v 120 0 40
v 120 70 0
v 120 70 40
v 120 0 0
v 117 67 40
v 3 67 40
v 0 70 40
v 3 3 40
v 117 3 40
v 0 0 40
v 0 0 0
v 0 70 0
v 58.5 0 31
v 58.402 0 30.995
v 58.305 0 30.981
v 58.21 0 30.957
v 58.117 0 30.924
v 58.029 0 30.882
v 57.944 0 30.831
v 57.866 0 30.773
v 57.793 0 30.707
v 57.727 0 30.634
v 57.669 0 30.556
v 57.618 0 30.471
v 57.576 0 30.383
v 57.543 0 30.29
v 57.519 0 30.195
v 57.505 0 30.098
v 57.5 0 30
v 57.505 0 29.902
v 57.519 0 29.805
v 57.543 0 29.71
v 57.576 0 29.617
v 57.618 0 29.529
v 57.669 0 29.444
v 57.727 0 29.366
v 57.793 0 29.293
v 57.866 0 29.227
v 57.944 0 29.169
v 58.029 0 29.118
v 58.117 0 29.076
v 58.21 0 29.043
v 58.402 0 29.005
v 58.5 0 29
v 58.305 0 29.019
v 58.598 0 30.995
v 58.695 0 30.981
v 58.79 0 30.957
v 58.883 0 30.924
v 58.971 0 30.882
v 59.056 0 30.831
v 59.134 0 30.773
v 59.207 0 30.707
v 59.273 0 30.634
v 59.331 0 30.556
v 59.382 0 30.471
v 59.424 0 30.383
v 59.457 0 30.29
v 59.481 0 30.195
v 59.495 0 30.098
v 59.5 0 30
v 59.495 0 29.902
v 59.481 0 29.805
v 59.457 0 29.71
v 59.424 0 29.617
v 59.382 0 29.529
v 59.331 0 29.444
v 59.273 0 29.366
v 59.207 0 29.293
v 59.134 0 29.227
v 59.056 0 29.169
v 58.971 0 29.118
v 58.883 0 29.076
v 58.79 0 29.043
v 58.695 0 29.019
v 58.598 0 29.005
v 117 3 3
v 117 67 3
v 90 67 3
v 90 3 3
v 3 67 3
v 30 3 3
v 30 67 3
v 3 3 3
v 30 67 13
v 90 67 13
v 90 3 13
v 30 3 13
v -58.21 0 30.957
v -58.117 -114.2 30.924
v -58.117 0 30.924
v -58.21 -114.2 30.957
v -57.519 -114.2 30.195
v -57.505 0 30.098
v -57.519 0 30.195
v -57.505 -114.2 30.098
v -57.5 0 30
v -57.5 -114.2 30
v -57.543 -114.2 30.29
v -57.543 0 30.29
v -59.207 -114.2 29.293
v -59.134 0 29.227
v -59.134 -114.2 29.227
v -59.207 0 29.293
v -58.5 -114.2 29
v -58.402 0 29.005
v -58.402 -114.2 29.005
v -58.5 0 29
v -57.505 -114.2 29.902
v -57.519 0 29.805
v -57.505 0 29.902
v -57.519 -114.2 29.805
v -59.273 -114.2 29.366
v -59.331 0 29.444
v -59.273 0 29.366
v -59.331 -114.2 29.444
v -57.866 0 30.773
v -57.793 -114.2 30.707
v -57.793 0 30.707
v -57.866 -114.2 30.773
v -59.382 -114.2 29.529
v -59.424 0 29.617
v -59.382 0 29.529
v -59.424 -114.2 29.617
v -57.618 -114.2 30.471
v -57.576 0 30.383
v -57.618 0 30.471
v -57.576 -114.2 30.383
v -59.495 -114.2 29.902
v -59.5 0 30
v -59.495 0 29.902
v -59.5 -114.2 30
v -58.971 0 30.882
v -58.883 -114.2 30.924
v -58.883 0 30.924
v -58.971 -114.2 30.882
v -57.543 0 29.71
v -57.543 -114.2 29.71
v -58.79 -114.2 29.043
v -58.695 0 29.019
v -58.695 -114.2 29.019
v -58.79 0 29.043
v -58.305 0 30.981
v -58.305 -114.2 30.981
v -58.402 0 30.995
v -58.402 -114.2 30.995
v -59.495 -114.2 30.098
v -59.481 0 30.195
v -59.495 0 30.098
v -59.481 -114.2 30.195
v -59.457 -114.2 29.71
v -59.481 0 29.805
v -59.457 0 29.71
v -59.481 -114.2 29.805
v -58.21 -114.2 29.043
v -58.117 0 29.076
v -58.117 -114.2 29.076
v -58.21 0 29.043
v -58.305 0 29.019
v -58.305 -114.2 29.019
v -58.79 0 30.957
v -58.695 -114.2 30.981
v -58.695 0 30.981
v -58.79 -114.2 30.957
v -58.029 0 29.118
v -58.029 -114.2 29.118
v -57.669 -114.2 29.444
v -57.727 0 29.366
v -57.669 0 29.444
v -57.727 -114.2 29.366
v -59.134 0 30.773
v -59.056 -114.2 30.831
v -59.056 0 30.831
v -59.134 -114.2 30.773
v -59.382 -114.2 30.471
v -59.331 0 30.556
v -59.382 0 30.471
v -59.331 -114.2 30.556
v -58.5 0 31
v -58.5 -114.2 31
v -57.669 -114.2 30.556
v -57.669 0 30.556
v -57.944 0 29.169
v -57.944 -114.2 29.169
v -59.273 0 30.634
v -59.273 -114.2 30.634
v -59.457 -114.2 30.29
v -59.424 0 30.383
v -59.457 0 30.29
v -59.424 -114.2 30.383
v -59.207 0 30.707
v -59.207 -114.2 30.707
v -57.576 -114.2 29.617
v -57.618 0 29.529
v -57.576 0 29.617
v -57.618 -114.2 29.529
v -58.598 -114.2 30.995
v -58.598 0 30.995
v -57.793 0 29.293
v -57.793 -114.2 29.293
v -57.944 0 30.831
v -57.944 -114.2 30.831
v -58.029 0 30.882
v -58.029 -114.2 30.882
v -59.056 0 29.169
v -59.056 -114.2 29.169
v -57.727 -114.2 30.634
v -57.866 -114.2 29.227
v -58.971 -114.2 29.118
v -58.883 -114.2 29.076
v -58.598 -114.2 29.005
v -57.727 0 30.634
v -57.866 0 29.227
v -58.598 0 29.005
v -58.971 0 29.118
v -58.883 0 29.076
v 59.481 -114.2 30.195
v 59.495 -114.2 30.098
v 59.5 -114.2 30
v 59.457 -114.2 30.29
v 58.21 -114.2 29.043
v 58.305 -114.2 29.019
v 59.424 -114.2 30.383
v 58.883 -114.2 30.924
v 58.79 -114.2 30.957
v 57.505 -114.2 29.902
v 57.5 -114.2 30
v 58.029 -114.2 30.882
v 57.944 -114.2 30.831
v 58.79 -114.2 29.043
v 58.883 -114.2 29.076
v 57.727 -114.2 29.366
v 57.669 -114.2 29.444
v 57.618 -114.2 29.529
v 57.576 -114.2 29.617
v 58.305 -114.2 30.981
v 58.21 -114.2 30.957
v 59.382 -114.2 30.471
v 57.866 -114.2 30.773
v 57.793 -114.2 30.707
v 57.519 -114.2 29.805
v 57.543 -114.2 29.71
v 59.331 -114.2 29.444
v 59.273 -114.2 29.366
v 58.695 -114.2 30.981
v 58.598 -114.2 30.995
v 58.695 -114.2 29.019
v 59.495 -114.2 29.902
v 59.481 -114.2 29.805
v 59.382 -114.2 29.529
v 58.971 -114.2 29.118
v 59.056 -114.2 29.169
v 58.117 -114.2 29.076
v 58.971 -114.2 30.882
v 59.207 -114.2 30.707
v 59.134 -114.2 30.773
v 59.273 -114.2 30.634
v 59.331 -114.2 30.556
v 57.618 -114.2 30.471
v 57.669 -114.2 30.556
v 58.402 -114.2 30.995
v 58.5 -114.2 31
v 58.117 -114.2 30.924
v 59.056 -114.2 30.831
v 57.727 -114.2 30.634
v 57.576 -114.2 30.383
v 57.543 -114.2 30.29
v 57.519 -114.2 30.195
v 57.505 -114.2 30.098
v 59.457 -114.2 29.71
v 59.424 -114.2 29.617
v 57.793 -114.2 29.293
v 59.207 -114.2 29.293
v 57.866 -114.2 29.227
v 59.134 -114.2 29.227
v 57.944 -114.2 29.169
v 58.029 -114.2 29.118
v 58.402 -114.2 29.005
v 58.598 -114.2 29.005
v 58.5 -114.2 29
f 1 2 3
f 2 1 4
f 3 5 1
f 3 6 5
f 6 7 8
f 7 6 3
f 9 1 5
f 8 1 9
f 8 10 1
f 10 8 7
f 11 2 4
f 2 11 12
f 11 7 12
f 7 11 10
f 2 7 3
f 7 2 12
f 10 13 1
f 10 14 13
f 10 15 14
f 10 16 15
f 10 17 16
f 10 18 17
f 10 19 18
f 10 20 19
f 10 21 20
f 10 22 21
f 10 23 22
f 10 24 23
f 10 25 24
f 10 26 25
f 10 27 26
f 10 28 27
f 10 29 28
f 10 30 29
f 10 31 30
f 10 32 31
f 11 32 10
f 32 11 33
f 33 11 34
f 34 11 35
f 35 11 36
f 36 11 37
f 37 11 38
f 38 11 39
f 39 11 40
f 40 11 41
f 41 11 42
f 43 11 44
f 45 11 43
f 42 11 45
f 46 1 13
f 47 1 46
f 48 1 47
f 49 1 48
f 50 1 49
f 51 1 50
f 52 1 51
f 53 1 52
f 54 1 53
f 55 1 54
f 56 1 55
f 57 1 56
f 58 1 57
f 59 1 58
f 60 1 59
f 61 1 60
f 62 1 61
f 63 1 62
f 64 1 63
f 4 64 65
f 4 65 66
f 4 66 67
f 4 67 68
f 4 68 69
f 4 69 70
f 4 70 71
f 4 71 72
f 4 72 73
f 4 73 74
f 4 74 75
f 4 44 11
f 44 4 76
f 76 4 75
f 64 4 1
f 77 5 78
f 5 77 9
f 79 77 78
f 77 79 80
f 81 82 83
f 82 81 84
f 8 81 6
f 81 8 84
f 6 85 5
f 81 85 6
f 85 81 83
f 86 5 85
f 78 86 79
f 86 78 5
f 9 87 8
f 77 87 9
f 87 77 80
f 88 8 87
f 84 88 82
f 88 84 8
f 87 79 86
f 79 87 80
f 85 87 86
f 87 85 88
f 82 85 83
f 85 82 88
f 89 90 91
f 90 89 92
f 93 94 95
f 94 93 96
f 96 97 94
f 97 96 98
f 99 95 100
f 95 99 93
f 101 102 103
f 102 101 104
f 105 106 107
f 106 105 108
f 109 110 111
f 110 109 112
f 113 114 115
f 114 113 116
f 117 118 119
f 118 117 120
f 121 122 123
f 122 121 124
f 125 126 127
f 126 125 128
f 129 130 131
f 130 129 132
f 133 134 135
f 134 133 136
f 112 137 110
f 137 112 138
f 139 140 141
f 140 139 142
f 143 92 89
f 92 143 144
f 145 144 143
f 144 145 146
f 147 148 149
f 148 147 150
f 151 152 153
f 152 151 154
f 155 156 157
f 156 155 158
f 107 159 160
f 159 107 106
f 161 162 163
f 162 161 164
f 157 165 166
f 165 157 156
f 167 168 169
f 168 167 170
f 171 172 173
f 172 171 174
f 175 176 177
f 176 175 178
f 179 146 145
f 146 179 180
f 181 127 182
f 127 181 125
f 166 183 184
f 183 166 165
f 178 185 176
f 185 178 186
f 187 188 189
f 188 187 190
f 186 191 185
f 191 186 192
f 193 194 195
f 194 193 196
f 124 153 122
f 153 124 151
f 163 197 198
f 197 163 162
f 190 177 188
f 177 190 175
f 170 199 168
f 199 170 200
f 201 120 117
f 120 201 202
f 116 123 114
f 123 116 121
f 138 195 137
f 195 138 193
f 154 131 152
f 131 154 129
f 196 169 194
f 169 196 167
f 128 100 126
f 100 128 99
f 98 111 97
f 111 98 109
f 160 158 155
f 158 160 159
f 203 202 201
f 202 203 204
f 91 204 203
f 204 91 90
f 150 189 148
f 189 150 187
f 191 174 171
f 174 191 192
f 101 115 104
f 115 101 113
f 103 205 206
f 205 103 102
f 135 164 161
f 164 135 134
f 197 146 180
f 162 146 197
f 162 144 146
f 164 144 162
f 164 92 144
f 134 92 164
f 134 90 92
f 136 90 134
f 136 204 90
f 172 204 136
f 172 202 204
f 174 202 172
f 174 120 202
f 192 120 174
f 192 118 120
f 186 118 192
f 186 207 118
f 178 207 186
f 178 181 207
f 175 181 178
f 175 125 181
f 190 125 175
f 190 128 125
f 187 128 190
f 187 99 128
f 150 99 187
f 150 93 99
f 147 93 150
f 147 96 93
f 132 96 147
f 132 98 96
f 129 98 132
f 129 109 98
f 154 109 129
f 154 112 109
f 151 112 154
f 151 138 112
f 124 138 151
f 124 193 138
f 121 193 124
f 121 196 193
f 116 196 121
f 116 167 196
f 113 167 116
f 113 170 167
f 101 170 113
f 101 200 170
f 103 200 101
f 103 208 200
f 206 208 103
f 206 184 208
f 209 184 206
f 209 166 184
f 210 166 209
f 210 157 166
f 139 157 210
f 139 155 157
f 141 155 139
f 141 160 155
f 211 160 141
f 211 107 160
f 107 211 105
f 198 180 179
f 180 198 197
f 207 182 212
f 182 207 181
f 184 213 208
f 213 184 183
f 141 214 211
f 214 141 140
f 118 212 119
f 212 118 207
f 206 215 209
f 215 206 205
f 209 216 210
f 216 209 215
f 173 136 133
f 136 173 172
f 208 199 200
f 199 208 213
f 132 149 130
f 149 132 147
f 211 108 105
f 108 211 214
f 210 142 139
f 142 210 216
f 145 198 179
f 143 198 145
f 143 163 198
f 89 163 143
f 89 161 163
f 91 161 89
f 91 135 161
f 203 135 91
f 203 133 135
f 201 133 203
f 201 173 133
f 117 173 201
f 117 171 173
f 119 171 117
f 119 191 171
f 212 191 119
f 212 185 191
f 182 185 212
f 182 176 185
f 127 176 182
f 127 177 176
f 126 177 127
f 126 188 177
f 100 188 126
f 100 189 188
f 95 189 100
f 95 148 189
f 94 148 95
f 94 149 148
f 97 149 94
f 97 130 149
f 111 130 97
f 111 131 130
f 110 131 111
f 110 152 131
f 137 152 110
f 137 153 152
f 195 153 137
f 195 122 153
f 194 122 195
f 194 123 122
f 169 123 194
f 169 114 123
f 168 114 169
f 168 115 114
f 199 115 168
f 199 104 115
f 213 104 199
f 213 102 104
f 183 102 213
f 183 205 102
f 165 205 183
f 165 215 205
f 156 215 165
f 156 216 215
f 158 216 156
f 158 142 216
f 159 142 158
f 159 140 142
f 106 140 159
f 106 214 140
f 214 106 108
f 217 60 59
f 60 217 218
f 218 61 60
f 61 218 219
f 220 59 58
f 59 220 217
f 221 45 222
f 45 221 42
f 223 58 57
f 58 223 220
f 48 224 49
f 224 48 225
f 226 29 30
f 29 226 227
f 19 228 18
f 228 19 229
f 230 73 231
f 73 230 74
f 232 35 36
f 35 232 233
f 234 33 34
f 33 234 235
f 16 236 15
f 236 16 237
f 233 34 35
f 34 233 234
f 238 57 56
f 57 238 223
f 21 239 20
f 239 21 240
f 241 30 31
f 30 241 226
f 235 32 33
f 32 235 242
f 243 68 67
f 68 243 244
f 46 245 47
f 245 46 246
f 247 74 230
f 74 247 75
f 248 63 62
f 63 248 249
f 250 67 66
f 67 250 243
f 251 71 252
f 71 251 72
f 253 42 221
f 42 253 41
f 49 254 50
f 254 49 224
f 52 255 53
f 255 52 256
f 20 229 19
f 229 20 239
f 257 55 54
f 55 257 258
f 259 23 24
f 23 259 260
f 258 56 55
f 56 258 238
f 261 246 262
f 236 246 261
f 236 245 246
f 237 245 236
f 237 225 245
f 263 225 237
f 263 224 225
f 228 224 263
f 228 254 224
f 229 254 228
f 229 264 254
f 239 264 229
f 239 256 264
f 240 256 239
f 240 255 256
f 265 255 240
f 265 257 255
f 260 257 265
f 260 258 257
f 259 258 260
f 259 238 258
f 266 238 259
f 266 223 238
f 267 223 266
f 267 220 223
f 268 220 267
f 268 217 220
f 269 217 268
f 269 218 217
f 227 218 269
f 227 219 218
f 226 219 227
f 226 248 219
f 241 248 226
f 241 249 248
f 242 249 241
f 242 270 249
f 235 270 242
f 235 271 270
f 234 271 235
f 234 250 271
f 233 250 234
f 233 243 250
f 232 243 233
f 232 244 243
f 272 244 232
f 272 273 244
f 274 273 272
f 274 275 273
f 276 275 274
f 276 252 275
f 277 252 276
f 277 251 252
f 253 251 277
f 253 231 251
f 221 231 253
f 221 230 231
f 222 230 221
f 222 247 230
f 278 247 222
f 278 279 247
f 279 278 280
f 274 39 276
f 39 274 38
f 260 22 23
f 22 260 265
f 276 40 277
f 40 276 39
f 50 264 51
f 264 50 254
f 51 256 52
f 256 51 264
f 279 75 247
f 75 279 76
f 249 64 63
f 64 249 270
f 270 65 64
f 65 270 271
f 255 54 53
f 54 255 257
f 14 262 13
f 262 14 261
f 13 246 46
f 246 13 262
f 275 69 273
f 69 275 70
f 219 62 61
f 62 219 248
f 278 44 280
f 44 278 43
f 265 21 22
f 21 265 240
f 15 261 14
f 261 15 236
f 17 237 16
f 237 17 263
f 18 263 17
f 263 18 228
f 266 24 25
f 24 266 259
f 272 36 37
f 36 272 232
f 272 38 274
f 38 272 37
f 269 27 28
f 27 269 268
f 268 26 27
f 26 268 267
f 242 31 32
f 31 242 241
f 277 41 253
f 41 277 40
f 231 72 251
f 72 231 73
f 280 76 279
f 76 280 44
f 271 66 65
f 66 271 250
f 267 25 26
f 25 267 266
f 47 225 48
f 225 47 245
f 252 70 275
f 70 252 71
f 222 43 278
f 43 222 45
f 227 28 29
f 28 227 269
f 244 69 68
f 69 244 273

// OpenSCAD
// Buffer tank for mini horizontal gel-electrophoresis box
// Dimensions in mm

// Outer dimensions
outer_x = 120;
outer_y = 70;
outer_z = 40;

// Wall and floor thickness
wall_thickness = 3;
floor_thickness = 3;

// Platform dimensions
platform_x = 60;
// Platform spans full inner width (Y)
platform_y = outer_y - 2 * wall_thickness; 
// Top of platform is at z = 13
platform_top_z = 13; 
// Bottom of platform is at floor level (z = floor_thickness)
platform_bottom_z = floor_thickness; 

// Electrode hole dimensions
hole_diameter = 2;
hole_z = 30;
hole_y = 0;

// Calculate inner dimensions
inner_x = outer_x - 2 * wall_thickness;
inner_y = outer_y - 2 * wall_thickness;

// Calculate platform start and end in X (centred)
platform_start_x = (outer_x - platform_x) / 2;
platform_end_x = platform_start_x + platform_x;

// Set global resolution
$fn = 64;

// Build the tank
module buffer_tank() {
    // Main tank body (outer shell with inner cavity)
    difference() {
        // Outer box
        cube([outer_x, outer_y, outer_z], center = false);
        
        // Inner cavity (subtract inner volume)
        // The cavity starts at the inner floor height (z = floor_thickness)
        // and goes up to the top of the tank (z = outer_z)
        translate([wall_thickness, wall_thickness, floor_thickness]) {
            cube([inner_x, inner_y, outer_z - floor_thickness], center = false);
        }
    }
    
    // Raised platform for gel tray
    // The platform sits on the inner floor (z = floor_thickness)
    // and extends up to z = platform_top_z (13 mm)
    // It spans the full inner width in Y
    translate([platform_start_x, wall_thickness, platform_bottom_z]) {
        cube([platform_x, platform_y, platform_top_z - platform_bottom_z], center = false);
    }
    
    // Electrode holes through end walls
    // The holes are horizontal along X, at y = 0 (center of Y), z = 30
    // They go through the walls at the two X ends
    
    // Left end wall hole
    // The hole center is at x = wall_thickness/2 (center of left wall)
    // The hole length must span the entire inner width plus some extra to ensure clean cutting
    hole_length = outer_x - 2 * wall_thickness + 0.1; // Span inner width + small overlap
    translate([-outer_x/2 + wall_thickness/2, hole_y, hole_z]) {
        rotate([90, 0, 0]) {
            cylinder(d = hole_diameter, h = hole_length + 0.1, center = false);
        }
    }
    
    // Right end wall hole
    // The hole center is at x = outer_x - wall_thickness/2 (center of right wall)
    translate([outer_x/2 - wall_thickness/2, hole_y, hole_z]) {
        rotate([90, 0, 0]) {
            cylinder(d = hole_diameter, h = hole_length + 0.1, center = false);
        }
    }
}

// Render the part
buffer_tank();
